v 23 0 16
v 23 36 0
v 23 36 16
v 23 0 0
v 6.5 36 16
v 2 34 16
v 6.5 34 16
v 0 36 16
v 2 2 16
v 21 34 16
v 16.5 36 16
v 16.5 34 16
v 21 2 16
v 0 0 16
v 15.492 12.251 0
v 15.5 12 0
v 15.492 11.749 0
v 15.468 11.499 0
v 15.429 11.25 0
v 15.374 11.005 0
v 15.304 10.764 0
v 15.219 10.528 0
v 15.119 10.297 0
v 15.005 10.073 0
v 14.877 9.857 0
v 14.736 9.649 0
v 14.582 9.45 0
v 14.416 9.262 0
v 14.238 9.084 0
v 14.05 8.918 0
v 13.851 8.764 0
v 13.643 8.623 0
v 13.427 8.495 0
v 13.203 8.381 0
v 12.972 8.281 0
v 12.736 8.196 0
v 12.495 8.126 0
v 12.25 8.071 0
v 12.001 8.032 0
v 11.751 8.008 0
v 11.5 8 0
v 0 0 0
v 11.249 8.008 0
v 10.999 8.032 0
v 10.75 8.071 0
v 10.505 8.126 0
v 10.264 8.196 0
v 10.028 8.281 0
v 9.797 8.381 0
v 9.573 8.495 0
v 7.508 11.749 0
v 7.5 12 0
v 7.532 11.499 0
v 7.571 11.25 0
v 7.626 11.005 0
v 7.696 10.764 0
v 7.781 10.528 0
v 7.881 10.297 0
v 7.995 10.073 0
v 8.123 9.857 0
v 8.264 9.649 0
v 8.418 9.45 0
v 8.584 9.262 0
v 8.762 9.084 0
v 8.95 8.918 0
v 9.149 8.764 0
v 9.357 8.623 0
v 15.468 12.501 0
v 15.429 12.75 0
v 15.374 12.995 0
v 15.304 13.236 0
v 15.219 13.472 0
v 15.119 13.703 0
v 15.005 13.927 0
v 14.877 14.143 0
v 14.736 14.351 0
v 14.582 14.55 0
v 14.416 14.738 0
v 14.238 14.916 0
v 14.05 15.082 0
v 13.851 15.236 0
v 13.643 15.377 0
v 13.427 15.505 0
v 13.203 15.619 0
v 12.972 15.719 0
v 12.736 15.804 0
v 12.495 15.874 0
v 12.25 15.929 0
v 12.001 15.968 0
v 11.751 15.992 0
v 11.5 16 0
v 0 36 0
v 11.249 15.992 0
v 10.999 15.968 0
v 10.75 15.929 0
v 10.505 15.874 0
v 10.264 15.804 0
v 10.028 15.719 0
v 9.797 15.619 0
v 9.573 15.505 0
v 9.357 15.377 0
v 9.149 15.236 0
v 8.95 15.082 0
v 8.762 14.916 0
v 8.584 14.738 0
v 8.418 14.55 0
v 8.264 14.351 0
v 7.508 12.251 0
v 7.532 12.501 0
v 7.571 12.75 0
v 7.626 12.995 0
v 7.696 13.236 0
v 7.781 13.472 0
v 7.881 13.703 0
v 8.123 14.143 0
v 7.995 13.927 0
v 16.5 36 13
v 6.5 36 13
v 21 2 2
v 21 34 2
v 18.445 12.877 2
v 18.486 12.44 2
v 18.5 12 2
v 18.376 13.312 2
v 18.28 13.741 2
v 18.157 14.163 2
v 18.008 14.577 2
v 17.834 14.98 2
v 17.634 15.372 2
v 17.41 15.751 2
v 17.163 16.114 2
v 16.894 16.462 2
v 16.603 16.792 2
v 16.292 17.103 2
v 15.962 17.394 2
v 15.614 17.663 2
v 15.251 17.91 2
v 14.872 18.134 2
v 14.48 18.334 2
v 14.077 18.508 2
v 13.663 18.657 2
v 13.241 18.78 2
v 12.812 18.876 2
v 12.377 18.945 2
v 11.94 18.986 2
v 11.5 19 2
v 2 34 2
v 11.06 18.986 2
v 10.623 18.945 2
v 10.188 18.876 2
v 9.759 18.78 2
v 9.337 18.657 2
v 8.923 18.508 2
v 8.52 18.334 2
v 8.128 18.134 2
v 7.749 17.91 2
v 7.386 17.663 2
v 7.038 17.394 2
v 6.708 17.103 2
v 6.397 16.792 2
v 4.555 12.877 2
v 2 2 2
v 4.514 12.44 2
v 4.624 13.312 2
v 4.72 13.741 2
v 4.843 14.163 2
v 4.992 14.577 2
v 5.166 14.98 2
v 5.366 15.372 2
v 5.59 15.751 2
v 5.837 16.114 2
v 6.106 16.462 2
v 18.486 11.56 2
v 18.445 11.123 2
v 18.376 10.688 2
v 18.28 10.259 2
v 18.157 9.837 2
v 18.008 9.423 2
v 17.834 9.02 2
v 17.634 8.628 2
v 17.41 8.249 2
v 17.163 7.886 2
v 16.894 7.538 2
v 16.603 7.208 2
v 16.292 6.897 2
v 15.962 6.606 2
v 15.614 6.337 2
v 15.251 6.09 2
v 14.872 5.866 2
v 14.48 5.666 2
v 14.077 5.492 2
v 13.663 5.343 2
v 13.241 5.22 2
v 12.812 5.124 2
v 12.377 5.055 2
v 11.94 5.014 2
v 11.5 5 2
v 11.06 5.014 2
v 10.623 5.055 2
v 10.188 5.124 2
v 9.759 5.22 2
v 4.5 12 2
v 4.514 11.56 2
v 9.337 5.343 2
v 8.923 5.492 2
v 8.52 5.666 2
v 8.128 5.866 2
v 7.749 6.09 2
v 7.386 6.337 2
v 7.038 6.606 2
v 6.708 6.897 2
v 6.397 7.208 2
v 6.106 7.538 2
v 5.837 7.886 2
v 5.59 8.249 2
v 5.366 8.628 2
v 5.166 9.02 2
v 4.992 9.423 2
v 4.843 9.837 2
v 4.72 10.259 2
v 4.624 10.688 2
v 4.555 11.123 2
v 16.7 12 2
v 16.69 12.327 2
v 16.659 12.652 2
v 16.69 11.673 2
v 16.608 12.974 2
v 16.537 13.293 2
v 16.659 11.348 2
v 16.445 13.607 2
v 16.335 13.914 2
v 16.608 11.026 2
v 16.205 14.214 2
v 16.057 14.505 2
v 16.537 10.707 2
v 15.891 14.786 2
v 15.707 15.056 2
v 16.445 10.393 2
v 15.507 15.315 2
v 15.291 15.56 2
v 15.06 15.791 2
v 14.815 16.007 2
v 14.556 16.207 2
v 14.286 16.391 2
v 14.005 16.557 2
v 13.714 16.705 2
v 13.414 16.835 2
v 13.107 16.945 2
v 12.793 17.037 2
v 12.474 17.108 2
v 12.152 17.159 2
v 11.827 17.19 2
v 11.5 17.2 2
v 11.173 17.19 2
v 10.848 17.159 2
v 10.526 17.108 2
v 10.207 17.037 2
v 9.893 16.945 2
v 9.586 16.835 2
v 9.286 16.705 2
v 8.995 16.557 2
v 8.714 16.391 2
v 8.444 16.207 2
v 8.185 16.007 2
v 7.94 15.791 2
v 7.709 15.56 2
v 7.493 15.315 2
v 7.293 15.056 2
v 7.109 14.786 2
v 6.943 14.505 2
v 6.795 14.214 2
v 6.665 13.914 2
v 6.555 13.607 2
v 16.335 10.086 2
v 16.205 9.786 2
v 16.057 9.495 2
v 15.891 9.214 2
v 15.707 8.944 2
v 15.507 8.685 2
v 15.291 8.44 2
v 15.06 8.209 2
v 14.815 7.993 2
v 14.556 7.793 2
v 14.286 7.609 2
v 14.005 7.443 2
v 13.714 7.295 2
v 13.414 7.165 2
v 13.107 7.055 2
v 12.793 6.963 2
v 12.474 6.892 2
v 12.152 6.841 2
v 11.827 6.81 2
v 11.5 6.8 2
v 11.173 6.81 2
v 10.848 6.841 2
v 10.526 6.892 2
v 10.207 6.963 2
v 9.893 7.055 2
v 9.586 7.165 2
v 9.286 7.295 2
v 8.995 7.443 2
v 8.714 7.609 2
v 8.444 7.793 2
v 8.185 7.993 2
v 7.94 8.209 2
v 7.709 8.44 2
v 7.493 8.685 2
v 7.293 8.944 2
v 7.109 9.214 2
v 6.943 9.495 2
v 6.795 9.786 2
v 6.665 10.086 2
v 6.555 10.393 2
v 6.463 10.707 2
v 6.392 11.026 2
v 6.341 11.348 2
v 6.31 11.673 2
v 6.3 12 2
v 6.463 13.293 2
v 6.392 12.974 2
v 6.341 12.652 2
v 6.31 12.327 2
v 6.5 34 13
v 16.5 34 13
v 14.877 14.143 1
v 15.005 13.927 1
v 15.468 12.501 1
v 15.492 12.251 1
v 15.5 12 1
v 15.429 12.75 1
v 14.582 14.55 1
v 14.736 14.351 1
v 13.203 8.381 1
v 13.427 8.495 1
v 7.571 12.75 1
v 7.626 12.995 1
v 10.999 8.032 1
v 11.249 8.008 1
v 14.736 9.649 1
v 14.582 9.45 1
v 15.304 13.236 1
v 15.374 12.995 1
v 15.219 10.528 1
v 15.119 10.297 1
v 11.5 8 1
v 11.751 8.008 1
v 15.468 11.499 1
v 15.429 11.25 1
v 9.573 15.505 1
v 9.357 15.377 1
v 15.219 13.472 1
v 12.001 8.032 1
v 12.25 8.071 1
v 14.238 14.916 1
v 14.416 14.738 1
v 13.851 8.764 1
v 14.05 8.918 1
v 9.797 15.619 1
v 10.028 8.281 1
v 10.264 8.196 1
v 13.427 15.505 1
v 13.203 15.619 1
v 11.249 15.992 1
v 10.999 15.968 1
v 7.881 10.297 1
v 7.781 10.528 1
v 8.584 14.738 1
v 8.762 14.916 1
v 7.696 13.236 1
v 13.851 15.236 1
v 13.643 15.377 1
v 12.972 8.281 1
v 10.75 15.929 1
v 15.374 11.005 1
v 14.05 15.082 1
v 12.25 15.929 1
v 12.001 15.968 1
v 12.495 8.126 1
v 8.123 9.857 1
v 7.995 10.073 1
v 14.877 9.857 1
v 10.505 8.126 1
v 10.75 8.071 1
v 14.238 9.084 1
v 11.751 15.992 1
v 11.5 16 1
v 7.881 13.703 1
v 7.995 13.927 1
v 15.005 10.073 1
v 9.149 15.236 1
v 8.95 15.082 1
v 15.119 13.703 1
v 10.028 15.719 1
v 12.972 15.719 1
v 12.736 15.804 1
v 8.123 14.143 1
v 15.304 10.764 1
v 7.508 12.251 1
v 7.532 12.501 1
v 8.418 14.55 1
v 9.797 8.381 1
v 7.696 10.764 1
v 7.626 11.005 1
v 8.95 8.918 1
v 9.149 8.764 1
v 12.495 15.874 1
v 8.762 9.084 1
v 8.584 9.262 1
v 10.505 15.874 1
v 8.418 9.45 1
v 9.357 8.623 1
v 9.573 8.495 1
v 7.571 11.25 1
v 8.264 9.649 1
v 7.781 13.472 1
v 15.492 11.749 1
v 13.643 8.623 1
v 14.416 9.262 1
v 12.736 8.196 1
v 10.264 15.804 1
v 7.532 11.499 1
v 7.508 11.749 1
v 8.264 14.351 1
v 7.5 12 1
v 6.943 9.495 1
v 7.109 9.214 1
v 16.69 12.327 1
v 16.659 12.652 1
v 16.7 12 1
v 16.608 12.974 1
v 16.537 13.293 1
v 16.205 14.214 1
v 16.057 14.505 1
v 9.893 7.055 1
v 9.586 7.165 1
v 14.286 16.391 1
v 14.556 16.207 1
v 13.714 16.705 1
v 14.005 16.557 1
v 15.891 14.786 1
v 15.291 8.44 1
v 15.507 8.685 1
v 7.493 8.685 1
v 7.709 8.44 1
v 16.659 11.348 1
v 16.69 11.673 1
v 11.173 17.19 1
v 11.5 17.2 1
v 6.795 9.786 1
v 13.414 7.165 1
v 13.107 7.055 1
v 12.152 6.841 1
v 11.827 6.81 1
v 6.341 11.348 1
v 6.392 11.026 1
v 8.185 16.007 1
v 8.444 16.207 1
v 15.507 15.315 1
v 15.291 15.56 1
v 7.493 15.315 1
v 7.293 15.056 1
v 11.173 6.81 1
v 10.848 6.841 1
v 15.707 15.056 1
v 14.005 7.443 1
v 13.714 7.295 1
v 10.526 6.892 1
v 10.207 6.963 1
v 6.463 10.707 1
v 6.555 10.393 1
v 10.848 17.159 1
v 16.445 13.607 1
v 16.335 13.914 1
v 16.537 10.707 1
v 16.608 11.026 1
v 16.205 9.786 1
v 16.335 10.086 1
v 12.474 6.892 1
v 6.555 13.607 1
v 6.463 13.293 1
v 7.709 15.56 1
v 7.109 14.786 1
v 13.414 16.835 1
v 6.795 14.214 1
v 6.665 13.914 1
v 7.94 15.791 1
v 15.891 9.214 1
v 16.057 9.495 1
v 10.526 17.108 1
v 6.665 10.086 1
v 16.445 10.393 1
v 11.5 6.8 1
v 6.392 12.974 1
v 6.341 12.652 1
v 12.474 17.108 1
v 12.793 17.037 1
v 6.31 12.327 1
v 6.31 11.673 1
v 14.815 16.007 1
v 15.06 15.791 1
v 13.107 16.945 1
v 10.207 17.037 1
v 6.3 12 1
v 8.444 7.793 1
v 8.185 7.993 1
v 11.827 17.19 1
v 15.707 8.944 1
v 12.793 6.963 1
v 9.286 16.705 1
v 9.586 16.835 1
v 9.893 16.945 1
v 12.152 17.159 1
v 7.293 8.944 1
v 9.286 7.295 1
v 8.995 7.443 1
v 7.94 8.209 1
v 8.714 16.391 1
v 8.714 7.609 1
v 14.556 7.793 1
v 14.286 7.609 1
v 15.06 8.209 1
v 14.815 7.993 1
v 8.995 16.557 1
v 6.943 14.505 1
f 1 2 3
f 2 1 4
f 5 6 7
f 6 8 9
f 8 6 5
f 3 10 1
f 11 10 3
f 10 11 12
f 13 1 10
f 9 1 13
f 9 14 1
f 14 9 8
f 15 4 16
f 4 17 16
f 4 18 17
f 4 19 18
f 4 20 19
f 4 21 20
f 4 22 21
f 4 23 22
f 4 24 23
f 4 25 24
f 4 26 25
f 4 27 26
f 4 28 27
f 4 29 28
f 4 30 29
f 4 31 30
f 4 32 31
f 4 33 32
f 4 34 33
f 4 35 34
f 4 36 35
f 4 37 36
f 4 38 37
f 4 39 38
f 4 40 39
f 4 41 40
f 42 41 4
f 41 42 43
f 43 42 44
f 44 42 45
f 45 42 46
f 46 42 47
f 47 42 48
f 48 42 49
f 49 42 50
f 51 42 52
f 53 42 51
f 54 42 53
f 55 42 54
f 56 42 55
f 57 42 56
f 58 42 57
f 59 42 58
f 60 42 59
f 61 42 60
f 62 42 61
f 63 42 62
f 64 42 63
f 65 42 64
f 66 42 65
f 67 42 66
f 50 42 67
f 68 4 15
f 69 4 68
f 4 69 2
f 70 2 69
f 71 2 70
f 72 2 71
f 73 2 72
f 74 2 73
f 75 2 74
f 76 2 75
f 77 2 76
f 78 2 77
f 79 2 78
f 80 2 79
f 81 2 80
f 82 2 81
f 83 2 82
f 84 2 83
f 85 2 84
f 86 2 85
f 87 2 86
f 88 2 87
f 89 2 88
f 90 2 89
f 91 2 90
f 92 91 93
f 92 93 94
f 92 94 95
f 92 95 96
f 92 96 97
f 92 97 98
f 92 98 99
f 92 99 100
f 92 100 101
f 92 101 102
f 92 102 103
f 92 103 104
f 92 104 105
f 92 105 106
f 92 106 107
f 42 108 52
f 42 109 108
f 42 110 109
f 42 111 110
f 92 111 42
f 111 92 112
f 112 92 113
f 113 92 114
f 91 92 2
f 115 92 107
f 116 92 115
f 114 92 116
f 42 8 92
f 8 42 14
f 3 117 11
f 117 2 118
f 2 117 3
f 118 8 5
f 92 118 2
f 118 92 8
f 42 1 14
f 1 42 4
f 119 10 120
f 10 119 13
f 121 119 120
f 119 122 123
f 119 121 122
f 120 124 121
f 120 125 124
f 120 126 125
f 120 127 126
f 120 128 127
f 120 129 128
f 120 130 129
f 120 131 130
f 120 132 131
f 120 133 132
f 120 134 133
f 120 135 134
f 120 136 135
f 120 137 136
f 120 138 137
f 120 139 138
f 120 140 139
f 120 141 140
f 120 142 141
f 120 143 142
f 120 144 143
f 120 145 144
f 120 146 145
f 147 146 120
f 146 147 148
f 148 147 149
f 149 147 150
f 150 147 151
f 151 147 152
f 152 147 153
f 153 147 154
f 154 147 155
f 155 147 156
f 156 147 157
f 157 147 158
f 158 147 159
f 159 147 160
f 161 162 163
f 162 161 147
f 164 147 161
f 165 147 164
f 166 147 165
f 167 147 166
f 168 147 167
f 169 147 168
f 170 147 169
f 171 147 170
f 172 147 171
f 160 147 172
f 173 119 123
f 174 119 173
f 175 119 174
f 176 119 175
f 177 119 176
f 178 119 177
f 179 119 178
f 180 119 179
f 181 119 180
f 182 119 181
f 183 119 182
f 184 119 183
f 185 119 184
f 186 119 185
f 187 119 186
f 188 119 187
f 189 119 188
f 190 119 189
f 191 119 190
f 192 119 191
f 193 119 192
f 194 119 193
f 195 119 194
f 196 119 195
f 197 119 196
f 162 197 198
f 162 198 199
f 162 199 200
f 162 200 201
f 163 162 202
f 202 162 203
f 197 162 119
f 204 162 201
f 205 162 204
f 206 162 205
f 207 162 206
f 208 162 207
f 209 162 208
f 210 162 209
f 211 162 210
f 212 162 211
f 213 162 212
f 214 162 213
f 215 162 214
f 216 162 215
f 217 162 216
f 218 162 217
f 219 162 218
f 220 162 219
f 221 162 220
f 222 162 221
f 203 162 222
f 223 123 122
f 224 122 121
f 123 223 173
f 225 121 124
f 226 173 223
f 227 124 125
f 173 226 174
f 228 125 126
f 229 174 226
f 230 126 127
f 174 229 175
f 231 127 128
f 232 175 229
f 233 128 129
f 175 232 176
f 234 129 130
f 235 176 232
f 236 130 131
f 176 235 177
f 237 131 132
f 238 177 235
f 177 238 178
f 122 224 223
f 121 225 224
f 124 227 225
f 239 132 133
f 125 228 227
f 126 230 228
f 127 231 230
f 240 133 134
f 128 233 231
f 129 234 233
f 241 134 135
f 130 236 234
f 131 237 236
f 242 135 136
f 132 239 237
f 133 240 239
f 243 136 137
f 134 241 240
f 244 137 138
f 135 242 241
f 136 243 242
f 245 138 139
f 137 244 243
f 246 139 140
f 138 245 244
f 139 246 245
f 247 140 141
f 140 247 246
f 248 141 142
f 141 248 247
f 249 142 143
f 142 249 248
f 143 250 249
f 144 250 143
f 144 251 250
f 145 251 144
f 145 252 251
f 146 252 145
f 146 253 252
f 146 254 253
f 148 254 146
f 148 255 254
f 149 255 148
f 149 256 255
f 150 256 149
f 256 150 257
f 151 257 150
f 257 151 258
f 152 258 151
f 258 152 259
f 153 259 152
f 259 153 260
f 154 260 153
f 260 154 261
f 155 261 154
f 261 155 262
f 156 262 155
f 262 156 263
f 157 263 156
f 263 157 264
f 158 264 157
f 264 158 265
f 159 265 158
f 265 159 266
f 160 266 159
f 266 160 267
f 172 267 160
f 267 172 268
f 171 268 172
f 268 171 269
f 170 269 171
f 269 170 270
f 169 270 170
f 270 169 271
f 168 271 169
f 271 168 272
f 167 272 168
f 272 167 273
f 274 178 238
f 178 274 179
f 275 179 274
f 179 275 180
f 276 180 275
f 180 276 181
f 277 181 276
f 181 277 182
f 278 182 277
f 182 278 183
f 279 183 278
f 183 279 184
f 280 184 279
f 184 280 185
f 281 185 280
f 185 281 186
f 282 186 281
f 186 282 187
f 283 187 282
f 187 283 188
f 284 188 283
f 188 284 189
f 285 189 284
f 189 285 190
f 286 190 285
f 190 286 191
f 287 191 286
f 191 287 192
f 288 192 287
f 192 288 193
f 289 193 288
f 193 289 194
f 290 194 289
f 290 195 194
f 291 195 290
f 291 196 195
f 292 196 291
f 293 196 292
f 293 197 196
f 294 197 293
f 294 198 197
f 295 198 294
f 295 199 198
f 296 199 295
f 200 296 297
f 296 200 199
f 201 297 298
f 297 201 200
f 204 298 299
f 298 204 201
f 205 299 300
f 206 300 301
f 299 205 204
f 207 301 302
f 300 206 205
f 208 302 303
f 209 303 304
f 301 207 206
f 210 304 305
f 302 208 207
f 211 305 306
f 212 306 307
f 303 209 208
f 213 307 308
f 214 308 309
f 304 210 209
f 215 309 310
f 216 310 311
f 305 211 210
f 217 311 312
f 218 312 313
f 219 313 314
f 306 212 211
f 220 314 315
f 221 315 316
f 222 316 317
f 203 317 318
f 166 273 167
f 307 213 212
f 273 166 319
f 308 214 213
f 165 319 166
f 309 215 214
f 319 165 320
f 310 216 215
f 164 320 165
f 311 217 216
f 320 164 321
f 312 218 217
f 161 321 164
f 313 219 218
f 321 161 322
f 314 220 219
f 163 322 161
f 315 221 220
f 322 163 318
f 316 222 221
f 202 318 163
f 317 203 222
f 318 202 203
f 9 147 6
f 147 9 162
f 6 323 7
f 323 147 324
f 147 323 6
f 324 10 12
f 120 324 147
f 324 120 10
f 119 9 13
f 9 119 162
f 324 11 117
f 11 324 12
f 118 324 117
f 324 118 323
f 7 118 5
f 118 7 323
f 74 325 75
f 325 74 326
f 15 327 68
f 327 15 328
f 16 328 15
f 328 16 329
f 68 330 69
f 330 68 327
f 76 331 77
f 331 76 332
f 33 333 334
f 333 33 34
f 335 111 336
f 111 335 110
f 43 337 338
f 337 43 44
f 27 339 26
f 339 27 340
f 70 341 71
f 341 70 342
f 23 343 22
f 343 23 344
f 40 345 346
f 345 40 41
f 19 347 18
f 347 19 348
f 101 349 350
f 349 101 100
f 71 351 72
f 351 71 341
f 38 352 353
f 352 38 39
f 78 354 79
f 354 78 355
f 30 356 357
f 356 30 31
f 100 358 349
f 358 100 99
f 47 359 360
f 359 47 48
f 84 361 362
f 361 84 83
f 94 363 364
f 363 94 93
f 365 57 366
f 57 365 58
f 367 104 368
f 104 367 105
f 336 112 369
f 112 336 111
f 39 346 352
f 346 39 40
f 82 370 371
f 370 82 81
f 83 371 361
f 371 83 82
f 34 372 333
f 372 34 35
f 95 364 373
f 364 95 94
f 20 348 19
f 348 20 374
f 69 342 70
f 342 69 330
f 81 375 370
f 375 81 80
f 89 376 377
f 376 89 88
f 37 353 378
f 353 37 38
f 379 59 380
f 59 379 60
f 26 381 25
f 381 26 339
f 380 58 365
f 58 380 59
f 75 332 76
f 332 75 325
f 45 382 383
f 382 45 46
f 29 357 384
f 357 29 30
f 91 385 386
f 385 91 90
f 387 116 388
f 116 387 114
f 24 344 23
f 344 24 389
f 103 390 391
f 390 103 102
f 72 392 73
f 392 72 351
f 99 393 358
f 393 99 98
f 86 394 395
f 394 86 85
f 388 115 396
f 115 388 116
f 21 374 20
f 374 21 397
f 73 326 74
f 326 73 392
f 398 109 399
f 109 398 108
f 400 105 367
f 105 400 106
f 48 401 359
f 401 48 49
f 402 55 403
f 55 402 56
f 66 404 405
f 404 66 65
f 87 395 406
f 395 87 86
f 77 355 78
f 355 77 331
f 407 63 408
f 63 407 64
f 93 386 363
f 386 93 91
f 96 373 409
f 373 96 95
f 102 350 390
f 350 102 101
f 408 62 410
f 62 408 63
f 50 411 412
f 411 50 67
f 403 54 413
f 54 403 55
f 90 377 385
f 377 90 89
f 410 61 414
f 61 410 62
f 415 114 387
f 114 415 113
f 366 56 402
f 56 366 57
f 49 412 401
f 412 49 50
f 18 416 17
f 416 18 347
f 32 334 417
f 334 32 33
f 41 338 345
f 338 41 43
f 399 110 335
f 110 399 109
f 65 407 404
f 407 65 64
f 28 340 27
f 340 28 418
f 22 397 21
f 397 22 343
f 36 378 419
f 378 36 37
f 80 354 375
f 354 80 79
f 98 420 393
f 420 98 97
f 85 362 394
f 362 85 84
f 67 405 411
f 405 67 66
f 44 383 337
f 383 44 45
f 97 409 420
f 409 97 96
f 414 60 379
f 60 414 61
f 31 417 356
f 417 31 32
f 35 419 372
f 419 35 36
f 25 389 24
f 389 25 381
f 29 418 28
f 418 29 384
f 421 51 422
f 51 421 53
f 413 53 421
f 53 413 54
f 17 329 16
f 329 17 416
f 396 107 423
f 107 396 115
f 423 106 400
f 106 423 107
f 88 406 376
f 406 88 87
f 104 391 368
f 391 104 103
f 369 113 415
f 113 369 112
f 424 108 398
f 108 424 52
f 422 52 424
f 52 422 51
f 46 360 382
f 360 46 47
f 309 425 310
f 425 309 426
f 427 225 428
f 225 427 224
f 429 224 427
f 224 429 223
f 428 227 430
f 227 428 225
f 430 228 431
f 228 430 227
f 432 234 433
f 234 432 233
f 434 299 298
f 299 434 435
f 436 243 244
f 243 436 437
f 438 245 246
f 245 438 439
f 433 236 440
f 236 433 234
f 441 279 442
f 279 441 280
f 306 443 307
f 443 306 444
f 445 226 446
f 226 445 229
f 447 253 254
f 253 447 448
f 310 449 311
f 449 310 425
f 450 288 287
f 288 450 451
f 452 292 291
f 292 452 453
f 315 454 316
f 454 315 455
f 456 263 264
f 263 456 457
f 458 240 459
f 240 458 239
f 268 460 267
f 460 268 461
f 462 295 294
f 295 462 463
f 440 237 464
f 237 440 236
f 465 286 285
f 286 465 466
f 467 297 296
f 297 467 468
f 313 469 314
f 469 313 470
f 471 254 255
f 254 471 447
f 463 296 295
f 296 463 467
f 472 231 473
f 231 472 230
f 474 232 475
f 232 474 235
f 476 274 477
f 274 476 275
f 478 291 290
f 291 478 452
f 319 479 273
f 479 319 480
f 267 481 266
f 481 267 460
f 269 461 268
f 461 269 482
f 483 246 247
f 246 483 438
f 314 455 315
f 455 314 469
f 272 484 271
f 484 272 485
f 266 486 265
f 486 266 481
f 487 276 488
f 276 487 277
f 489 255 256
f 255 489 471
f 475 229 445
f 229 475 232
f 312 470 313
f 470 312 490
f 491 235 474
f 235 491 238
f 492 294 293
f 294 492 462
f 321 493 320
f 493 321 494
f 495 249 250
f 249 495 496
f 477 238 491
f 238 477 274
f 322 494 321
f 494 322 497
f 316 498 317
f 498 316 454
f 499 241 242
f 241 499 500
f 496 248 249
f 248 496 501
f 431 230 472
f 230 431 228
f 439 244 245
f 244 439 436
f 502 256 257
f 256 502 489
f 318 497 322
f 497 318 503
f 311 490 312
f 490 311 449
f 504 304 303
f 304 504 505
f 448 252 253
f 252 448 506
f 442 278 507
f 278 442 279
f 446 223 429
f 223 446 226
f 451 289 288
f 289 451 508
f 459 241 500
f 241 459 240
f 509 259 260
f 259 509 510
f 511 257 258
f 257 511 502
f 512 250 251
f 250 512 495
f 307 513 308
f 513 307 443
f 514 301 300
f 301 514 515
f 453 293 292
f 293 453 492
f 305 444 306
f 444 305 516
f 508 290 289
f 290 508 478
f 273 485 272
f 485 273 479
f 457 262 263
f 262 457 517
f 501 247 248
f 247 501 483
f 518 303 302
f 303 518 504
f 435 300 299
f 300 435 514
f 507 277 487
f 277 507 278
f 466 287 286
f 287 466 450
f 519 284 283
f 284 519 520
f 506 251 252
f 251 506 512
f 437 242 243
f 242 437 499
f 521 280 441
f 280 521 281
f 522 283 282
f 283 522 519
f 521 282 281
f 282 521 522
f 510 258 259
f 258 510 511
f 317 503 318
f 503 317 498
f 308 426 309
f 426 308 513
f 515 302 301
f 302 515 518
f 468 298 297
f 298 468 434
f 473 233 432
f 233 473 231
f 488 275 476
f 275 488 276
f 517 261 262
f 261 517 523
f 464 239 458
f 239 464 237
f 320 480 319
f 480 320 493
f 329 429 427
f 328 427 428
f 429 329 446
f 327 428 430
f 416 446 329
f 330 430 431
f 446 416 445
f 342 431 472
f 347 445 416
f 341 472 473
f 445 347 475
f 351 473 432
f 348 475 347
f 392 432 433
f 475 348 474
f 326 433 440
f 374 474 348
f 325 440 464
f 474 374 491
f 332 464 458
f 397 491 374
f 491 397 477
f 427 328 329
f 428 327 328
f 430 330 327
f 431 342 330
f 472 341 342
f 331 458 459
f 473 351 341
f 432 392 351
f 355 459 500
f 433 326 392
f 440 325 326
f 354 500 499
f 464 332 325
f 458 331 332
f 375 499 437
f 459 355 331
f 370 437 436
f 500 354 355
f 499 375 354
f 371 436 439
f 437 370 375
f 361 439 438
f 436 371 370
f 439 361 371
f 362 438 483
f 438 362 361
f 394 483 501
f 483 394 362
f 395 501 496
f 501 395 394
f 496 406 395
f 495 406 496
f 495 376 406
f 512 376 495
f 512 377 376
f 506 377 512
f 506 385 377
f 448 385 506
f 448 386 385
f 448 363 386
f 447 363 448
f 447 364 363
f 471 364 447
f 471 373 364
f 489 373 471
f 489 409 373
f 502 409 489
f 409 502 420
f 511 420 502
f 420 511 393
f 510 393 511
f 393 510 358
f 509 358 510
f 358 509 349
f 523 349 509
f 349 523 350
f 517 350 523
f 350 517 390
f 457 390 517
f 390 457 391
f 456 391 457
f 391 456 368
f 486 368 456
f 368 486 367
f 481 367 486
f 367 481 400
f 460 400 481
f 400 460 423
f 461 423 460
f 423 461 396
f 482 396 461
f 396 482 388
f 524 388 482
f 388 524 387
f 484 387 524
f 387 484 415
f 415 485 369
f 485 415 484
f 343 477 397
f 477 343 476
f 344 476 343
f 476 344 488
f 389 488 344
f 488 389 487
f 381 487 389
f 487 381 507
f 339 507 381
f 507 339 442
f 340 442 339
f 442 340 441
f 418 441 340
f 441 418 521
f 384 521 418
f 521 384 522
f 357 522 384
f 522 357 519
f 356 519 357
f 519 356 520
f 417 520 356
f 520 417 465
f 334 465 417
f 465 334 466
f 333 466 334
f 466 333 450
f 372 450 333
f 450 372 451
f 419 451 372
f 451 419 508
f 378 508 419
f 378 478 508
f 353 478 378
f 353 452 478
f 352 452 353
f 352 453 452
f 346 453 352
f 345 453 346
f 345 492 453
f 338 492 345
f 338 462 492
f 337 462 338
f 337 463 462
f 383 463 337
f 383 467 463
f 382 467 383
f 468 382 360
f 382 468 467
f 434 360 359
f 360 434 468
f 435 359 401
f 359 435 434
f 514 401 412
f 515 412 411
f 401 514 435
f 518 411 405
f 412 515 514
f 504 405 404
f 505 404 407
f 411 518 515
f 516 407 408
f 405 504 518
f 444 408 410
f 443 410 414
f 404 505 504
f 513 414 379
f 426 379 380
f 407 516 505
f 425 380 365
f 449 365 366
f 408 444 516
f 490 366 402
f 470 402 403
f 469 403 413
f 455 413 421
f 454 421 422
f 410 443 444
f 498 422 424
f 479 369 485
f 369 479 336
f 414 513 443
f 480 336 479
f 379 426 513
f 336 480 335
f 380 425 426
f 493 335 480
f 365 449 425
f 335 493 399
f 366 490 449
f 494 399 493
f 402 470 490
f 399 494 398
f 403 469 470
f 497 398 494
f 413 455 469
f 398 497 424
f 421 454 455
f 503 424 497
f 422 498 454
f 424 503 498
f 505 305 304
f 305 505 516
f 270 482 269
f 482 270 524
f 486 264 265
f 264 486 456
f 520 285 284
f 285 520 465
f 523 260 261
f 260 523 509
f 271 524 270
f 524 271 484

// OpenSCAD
x_cube=23;
y_cube=36;
z_cube=16;
rayon=4;
dec=12;
$fn=100;


difference(){
cube([x_cube,y_cube,z_cube]);
    translate ([x_cube/2,dec,-2]) cylinder (r=rayon+1.5, h=20); 
    translate ([2,2,2], center=true) cube([x_cube-4,y_cube-4,z_cube]);
    translate ([x_cube/2-5,y_cube-4,z_cube-3]) cube(10,8,4);
}
difference(){
    
translate ([x_cube/2,dec,0]) cylinder (r=rayon+3, h=2);

translate ([x_cube/2,dec,-1]) cylinder (r=rayon, h=6);
translate ([x_cube/2,dec,1]) cylinder (r=rayon+1.2, h=4);
}
